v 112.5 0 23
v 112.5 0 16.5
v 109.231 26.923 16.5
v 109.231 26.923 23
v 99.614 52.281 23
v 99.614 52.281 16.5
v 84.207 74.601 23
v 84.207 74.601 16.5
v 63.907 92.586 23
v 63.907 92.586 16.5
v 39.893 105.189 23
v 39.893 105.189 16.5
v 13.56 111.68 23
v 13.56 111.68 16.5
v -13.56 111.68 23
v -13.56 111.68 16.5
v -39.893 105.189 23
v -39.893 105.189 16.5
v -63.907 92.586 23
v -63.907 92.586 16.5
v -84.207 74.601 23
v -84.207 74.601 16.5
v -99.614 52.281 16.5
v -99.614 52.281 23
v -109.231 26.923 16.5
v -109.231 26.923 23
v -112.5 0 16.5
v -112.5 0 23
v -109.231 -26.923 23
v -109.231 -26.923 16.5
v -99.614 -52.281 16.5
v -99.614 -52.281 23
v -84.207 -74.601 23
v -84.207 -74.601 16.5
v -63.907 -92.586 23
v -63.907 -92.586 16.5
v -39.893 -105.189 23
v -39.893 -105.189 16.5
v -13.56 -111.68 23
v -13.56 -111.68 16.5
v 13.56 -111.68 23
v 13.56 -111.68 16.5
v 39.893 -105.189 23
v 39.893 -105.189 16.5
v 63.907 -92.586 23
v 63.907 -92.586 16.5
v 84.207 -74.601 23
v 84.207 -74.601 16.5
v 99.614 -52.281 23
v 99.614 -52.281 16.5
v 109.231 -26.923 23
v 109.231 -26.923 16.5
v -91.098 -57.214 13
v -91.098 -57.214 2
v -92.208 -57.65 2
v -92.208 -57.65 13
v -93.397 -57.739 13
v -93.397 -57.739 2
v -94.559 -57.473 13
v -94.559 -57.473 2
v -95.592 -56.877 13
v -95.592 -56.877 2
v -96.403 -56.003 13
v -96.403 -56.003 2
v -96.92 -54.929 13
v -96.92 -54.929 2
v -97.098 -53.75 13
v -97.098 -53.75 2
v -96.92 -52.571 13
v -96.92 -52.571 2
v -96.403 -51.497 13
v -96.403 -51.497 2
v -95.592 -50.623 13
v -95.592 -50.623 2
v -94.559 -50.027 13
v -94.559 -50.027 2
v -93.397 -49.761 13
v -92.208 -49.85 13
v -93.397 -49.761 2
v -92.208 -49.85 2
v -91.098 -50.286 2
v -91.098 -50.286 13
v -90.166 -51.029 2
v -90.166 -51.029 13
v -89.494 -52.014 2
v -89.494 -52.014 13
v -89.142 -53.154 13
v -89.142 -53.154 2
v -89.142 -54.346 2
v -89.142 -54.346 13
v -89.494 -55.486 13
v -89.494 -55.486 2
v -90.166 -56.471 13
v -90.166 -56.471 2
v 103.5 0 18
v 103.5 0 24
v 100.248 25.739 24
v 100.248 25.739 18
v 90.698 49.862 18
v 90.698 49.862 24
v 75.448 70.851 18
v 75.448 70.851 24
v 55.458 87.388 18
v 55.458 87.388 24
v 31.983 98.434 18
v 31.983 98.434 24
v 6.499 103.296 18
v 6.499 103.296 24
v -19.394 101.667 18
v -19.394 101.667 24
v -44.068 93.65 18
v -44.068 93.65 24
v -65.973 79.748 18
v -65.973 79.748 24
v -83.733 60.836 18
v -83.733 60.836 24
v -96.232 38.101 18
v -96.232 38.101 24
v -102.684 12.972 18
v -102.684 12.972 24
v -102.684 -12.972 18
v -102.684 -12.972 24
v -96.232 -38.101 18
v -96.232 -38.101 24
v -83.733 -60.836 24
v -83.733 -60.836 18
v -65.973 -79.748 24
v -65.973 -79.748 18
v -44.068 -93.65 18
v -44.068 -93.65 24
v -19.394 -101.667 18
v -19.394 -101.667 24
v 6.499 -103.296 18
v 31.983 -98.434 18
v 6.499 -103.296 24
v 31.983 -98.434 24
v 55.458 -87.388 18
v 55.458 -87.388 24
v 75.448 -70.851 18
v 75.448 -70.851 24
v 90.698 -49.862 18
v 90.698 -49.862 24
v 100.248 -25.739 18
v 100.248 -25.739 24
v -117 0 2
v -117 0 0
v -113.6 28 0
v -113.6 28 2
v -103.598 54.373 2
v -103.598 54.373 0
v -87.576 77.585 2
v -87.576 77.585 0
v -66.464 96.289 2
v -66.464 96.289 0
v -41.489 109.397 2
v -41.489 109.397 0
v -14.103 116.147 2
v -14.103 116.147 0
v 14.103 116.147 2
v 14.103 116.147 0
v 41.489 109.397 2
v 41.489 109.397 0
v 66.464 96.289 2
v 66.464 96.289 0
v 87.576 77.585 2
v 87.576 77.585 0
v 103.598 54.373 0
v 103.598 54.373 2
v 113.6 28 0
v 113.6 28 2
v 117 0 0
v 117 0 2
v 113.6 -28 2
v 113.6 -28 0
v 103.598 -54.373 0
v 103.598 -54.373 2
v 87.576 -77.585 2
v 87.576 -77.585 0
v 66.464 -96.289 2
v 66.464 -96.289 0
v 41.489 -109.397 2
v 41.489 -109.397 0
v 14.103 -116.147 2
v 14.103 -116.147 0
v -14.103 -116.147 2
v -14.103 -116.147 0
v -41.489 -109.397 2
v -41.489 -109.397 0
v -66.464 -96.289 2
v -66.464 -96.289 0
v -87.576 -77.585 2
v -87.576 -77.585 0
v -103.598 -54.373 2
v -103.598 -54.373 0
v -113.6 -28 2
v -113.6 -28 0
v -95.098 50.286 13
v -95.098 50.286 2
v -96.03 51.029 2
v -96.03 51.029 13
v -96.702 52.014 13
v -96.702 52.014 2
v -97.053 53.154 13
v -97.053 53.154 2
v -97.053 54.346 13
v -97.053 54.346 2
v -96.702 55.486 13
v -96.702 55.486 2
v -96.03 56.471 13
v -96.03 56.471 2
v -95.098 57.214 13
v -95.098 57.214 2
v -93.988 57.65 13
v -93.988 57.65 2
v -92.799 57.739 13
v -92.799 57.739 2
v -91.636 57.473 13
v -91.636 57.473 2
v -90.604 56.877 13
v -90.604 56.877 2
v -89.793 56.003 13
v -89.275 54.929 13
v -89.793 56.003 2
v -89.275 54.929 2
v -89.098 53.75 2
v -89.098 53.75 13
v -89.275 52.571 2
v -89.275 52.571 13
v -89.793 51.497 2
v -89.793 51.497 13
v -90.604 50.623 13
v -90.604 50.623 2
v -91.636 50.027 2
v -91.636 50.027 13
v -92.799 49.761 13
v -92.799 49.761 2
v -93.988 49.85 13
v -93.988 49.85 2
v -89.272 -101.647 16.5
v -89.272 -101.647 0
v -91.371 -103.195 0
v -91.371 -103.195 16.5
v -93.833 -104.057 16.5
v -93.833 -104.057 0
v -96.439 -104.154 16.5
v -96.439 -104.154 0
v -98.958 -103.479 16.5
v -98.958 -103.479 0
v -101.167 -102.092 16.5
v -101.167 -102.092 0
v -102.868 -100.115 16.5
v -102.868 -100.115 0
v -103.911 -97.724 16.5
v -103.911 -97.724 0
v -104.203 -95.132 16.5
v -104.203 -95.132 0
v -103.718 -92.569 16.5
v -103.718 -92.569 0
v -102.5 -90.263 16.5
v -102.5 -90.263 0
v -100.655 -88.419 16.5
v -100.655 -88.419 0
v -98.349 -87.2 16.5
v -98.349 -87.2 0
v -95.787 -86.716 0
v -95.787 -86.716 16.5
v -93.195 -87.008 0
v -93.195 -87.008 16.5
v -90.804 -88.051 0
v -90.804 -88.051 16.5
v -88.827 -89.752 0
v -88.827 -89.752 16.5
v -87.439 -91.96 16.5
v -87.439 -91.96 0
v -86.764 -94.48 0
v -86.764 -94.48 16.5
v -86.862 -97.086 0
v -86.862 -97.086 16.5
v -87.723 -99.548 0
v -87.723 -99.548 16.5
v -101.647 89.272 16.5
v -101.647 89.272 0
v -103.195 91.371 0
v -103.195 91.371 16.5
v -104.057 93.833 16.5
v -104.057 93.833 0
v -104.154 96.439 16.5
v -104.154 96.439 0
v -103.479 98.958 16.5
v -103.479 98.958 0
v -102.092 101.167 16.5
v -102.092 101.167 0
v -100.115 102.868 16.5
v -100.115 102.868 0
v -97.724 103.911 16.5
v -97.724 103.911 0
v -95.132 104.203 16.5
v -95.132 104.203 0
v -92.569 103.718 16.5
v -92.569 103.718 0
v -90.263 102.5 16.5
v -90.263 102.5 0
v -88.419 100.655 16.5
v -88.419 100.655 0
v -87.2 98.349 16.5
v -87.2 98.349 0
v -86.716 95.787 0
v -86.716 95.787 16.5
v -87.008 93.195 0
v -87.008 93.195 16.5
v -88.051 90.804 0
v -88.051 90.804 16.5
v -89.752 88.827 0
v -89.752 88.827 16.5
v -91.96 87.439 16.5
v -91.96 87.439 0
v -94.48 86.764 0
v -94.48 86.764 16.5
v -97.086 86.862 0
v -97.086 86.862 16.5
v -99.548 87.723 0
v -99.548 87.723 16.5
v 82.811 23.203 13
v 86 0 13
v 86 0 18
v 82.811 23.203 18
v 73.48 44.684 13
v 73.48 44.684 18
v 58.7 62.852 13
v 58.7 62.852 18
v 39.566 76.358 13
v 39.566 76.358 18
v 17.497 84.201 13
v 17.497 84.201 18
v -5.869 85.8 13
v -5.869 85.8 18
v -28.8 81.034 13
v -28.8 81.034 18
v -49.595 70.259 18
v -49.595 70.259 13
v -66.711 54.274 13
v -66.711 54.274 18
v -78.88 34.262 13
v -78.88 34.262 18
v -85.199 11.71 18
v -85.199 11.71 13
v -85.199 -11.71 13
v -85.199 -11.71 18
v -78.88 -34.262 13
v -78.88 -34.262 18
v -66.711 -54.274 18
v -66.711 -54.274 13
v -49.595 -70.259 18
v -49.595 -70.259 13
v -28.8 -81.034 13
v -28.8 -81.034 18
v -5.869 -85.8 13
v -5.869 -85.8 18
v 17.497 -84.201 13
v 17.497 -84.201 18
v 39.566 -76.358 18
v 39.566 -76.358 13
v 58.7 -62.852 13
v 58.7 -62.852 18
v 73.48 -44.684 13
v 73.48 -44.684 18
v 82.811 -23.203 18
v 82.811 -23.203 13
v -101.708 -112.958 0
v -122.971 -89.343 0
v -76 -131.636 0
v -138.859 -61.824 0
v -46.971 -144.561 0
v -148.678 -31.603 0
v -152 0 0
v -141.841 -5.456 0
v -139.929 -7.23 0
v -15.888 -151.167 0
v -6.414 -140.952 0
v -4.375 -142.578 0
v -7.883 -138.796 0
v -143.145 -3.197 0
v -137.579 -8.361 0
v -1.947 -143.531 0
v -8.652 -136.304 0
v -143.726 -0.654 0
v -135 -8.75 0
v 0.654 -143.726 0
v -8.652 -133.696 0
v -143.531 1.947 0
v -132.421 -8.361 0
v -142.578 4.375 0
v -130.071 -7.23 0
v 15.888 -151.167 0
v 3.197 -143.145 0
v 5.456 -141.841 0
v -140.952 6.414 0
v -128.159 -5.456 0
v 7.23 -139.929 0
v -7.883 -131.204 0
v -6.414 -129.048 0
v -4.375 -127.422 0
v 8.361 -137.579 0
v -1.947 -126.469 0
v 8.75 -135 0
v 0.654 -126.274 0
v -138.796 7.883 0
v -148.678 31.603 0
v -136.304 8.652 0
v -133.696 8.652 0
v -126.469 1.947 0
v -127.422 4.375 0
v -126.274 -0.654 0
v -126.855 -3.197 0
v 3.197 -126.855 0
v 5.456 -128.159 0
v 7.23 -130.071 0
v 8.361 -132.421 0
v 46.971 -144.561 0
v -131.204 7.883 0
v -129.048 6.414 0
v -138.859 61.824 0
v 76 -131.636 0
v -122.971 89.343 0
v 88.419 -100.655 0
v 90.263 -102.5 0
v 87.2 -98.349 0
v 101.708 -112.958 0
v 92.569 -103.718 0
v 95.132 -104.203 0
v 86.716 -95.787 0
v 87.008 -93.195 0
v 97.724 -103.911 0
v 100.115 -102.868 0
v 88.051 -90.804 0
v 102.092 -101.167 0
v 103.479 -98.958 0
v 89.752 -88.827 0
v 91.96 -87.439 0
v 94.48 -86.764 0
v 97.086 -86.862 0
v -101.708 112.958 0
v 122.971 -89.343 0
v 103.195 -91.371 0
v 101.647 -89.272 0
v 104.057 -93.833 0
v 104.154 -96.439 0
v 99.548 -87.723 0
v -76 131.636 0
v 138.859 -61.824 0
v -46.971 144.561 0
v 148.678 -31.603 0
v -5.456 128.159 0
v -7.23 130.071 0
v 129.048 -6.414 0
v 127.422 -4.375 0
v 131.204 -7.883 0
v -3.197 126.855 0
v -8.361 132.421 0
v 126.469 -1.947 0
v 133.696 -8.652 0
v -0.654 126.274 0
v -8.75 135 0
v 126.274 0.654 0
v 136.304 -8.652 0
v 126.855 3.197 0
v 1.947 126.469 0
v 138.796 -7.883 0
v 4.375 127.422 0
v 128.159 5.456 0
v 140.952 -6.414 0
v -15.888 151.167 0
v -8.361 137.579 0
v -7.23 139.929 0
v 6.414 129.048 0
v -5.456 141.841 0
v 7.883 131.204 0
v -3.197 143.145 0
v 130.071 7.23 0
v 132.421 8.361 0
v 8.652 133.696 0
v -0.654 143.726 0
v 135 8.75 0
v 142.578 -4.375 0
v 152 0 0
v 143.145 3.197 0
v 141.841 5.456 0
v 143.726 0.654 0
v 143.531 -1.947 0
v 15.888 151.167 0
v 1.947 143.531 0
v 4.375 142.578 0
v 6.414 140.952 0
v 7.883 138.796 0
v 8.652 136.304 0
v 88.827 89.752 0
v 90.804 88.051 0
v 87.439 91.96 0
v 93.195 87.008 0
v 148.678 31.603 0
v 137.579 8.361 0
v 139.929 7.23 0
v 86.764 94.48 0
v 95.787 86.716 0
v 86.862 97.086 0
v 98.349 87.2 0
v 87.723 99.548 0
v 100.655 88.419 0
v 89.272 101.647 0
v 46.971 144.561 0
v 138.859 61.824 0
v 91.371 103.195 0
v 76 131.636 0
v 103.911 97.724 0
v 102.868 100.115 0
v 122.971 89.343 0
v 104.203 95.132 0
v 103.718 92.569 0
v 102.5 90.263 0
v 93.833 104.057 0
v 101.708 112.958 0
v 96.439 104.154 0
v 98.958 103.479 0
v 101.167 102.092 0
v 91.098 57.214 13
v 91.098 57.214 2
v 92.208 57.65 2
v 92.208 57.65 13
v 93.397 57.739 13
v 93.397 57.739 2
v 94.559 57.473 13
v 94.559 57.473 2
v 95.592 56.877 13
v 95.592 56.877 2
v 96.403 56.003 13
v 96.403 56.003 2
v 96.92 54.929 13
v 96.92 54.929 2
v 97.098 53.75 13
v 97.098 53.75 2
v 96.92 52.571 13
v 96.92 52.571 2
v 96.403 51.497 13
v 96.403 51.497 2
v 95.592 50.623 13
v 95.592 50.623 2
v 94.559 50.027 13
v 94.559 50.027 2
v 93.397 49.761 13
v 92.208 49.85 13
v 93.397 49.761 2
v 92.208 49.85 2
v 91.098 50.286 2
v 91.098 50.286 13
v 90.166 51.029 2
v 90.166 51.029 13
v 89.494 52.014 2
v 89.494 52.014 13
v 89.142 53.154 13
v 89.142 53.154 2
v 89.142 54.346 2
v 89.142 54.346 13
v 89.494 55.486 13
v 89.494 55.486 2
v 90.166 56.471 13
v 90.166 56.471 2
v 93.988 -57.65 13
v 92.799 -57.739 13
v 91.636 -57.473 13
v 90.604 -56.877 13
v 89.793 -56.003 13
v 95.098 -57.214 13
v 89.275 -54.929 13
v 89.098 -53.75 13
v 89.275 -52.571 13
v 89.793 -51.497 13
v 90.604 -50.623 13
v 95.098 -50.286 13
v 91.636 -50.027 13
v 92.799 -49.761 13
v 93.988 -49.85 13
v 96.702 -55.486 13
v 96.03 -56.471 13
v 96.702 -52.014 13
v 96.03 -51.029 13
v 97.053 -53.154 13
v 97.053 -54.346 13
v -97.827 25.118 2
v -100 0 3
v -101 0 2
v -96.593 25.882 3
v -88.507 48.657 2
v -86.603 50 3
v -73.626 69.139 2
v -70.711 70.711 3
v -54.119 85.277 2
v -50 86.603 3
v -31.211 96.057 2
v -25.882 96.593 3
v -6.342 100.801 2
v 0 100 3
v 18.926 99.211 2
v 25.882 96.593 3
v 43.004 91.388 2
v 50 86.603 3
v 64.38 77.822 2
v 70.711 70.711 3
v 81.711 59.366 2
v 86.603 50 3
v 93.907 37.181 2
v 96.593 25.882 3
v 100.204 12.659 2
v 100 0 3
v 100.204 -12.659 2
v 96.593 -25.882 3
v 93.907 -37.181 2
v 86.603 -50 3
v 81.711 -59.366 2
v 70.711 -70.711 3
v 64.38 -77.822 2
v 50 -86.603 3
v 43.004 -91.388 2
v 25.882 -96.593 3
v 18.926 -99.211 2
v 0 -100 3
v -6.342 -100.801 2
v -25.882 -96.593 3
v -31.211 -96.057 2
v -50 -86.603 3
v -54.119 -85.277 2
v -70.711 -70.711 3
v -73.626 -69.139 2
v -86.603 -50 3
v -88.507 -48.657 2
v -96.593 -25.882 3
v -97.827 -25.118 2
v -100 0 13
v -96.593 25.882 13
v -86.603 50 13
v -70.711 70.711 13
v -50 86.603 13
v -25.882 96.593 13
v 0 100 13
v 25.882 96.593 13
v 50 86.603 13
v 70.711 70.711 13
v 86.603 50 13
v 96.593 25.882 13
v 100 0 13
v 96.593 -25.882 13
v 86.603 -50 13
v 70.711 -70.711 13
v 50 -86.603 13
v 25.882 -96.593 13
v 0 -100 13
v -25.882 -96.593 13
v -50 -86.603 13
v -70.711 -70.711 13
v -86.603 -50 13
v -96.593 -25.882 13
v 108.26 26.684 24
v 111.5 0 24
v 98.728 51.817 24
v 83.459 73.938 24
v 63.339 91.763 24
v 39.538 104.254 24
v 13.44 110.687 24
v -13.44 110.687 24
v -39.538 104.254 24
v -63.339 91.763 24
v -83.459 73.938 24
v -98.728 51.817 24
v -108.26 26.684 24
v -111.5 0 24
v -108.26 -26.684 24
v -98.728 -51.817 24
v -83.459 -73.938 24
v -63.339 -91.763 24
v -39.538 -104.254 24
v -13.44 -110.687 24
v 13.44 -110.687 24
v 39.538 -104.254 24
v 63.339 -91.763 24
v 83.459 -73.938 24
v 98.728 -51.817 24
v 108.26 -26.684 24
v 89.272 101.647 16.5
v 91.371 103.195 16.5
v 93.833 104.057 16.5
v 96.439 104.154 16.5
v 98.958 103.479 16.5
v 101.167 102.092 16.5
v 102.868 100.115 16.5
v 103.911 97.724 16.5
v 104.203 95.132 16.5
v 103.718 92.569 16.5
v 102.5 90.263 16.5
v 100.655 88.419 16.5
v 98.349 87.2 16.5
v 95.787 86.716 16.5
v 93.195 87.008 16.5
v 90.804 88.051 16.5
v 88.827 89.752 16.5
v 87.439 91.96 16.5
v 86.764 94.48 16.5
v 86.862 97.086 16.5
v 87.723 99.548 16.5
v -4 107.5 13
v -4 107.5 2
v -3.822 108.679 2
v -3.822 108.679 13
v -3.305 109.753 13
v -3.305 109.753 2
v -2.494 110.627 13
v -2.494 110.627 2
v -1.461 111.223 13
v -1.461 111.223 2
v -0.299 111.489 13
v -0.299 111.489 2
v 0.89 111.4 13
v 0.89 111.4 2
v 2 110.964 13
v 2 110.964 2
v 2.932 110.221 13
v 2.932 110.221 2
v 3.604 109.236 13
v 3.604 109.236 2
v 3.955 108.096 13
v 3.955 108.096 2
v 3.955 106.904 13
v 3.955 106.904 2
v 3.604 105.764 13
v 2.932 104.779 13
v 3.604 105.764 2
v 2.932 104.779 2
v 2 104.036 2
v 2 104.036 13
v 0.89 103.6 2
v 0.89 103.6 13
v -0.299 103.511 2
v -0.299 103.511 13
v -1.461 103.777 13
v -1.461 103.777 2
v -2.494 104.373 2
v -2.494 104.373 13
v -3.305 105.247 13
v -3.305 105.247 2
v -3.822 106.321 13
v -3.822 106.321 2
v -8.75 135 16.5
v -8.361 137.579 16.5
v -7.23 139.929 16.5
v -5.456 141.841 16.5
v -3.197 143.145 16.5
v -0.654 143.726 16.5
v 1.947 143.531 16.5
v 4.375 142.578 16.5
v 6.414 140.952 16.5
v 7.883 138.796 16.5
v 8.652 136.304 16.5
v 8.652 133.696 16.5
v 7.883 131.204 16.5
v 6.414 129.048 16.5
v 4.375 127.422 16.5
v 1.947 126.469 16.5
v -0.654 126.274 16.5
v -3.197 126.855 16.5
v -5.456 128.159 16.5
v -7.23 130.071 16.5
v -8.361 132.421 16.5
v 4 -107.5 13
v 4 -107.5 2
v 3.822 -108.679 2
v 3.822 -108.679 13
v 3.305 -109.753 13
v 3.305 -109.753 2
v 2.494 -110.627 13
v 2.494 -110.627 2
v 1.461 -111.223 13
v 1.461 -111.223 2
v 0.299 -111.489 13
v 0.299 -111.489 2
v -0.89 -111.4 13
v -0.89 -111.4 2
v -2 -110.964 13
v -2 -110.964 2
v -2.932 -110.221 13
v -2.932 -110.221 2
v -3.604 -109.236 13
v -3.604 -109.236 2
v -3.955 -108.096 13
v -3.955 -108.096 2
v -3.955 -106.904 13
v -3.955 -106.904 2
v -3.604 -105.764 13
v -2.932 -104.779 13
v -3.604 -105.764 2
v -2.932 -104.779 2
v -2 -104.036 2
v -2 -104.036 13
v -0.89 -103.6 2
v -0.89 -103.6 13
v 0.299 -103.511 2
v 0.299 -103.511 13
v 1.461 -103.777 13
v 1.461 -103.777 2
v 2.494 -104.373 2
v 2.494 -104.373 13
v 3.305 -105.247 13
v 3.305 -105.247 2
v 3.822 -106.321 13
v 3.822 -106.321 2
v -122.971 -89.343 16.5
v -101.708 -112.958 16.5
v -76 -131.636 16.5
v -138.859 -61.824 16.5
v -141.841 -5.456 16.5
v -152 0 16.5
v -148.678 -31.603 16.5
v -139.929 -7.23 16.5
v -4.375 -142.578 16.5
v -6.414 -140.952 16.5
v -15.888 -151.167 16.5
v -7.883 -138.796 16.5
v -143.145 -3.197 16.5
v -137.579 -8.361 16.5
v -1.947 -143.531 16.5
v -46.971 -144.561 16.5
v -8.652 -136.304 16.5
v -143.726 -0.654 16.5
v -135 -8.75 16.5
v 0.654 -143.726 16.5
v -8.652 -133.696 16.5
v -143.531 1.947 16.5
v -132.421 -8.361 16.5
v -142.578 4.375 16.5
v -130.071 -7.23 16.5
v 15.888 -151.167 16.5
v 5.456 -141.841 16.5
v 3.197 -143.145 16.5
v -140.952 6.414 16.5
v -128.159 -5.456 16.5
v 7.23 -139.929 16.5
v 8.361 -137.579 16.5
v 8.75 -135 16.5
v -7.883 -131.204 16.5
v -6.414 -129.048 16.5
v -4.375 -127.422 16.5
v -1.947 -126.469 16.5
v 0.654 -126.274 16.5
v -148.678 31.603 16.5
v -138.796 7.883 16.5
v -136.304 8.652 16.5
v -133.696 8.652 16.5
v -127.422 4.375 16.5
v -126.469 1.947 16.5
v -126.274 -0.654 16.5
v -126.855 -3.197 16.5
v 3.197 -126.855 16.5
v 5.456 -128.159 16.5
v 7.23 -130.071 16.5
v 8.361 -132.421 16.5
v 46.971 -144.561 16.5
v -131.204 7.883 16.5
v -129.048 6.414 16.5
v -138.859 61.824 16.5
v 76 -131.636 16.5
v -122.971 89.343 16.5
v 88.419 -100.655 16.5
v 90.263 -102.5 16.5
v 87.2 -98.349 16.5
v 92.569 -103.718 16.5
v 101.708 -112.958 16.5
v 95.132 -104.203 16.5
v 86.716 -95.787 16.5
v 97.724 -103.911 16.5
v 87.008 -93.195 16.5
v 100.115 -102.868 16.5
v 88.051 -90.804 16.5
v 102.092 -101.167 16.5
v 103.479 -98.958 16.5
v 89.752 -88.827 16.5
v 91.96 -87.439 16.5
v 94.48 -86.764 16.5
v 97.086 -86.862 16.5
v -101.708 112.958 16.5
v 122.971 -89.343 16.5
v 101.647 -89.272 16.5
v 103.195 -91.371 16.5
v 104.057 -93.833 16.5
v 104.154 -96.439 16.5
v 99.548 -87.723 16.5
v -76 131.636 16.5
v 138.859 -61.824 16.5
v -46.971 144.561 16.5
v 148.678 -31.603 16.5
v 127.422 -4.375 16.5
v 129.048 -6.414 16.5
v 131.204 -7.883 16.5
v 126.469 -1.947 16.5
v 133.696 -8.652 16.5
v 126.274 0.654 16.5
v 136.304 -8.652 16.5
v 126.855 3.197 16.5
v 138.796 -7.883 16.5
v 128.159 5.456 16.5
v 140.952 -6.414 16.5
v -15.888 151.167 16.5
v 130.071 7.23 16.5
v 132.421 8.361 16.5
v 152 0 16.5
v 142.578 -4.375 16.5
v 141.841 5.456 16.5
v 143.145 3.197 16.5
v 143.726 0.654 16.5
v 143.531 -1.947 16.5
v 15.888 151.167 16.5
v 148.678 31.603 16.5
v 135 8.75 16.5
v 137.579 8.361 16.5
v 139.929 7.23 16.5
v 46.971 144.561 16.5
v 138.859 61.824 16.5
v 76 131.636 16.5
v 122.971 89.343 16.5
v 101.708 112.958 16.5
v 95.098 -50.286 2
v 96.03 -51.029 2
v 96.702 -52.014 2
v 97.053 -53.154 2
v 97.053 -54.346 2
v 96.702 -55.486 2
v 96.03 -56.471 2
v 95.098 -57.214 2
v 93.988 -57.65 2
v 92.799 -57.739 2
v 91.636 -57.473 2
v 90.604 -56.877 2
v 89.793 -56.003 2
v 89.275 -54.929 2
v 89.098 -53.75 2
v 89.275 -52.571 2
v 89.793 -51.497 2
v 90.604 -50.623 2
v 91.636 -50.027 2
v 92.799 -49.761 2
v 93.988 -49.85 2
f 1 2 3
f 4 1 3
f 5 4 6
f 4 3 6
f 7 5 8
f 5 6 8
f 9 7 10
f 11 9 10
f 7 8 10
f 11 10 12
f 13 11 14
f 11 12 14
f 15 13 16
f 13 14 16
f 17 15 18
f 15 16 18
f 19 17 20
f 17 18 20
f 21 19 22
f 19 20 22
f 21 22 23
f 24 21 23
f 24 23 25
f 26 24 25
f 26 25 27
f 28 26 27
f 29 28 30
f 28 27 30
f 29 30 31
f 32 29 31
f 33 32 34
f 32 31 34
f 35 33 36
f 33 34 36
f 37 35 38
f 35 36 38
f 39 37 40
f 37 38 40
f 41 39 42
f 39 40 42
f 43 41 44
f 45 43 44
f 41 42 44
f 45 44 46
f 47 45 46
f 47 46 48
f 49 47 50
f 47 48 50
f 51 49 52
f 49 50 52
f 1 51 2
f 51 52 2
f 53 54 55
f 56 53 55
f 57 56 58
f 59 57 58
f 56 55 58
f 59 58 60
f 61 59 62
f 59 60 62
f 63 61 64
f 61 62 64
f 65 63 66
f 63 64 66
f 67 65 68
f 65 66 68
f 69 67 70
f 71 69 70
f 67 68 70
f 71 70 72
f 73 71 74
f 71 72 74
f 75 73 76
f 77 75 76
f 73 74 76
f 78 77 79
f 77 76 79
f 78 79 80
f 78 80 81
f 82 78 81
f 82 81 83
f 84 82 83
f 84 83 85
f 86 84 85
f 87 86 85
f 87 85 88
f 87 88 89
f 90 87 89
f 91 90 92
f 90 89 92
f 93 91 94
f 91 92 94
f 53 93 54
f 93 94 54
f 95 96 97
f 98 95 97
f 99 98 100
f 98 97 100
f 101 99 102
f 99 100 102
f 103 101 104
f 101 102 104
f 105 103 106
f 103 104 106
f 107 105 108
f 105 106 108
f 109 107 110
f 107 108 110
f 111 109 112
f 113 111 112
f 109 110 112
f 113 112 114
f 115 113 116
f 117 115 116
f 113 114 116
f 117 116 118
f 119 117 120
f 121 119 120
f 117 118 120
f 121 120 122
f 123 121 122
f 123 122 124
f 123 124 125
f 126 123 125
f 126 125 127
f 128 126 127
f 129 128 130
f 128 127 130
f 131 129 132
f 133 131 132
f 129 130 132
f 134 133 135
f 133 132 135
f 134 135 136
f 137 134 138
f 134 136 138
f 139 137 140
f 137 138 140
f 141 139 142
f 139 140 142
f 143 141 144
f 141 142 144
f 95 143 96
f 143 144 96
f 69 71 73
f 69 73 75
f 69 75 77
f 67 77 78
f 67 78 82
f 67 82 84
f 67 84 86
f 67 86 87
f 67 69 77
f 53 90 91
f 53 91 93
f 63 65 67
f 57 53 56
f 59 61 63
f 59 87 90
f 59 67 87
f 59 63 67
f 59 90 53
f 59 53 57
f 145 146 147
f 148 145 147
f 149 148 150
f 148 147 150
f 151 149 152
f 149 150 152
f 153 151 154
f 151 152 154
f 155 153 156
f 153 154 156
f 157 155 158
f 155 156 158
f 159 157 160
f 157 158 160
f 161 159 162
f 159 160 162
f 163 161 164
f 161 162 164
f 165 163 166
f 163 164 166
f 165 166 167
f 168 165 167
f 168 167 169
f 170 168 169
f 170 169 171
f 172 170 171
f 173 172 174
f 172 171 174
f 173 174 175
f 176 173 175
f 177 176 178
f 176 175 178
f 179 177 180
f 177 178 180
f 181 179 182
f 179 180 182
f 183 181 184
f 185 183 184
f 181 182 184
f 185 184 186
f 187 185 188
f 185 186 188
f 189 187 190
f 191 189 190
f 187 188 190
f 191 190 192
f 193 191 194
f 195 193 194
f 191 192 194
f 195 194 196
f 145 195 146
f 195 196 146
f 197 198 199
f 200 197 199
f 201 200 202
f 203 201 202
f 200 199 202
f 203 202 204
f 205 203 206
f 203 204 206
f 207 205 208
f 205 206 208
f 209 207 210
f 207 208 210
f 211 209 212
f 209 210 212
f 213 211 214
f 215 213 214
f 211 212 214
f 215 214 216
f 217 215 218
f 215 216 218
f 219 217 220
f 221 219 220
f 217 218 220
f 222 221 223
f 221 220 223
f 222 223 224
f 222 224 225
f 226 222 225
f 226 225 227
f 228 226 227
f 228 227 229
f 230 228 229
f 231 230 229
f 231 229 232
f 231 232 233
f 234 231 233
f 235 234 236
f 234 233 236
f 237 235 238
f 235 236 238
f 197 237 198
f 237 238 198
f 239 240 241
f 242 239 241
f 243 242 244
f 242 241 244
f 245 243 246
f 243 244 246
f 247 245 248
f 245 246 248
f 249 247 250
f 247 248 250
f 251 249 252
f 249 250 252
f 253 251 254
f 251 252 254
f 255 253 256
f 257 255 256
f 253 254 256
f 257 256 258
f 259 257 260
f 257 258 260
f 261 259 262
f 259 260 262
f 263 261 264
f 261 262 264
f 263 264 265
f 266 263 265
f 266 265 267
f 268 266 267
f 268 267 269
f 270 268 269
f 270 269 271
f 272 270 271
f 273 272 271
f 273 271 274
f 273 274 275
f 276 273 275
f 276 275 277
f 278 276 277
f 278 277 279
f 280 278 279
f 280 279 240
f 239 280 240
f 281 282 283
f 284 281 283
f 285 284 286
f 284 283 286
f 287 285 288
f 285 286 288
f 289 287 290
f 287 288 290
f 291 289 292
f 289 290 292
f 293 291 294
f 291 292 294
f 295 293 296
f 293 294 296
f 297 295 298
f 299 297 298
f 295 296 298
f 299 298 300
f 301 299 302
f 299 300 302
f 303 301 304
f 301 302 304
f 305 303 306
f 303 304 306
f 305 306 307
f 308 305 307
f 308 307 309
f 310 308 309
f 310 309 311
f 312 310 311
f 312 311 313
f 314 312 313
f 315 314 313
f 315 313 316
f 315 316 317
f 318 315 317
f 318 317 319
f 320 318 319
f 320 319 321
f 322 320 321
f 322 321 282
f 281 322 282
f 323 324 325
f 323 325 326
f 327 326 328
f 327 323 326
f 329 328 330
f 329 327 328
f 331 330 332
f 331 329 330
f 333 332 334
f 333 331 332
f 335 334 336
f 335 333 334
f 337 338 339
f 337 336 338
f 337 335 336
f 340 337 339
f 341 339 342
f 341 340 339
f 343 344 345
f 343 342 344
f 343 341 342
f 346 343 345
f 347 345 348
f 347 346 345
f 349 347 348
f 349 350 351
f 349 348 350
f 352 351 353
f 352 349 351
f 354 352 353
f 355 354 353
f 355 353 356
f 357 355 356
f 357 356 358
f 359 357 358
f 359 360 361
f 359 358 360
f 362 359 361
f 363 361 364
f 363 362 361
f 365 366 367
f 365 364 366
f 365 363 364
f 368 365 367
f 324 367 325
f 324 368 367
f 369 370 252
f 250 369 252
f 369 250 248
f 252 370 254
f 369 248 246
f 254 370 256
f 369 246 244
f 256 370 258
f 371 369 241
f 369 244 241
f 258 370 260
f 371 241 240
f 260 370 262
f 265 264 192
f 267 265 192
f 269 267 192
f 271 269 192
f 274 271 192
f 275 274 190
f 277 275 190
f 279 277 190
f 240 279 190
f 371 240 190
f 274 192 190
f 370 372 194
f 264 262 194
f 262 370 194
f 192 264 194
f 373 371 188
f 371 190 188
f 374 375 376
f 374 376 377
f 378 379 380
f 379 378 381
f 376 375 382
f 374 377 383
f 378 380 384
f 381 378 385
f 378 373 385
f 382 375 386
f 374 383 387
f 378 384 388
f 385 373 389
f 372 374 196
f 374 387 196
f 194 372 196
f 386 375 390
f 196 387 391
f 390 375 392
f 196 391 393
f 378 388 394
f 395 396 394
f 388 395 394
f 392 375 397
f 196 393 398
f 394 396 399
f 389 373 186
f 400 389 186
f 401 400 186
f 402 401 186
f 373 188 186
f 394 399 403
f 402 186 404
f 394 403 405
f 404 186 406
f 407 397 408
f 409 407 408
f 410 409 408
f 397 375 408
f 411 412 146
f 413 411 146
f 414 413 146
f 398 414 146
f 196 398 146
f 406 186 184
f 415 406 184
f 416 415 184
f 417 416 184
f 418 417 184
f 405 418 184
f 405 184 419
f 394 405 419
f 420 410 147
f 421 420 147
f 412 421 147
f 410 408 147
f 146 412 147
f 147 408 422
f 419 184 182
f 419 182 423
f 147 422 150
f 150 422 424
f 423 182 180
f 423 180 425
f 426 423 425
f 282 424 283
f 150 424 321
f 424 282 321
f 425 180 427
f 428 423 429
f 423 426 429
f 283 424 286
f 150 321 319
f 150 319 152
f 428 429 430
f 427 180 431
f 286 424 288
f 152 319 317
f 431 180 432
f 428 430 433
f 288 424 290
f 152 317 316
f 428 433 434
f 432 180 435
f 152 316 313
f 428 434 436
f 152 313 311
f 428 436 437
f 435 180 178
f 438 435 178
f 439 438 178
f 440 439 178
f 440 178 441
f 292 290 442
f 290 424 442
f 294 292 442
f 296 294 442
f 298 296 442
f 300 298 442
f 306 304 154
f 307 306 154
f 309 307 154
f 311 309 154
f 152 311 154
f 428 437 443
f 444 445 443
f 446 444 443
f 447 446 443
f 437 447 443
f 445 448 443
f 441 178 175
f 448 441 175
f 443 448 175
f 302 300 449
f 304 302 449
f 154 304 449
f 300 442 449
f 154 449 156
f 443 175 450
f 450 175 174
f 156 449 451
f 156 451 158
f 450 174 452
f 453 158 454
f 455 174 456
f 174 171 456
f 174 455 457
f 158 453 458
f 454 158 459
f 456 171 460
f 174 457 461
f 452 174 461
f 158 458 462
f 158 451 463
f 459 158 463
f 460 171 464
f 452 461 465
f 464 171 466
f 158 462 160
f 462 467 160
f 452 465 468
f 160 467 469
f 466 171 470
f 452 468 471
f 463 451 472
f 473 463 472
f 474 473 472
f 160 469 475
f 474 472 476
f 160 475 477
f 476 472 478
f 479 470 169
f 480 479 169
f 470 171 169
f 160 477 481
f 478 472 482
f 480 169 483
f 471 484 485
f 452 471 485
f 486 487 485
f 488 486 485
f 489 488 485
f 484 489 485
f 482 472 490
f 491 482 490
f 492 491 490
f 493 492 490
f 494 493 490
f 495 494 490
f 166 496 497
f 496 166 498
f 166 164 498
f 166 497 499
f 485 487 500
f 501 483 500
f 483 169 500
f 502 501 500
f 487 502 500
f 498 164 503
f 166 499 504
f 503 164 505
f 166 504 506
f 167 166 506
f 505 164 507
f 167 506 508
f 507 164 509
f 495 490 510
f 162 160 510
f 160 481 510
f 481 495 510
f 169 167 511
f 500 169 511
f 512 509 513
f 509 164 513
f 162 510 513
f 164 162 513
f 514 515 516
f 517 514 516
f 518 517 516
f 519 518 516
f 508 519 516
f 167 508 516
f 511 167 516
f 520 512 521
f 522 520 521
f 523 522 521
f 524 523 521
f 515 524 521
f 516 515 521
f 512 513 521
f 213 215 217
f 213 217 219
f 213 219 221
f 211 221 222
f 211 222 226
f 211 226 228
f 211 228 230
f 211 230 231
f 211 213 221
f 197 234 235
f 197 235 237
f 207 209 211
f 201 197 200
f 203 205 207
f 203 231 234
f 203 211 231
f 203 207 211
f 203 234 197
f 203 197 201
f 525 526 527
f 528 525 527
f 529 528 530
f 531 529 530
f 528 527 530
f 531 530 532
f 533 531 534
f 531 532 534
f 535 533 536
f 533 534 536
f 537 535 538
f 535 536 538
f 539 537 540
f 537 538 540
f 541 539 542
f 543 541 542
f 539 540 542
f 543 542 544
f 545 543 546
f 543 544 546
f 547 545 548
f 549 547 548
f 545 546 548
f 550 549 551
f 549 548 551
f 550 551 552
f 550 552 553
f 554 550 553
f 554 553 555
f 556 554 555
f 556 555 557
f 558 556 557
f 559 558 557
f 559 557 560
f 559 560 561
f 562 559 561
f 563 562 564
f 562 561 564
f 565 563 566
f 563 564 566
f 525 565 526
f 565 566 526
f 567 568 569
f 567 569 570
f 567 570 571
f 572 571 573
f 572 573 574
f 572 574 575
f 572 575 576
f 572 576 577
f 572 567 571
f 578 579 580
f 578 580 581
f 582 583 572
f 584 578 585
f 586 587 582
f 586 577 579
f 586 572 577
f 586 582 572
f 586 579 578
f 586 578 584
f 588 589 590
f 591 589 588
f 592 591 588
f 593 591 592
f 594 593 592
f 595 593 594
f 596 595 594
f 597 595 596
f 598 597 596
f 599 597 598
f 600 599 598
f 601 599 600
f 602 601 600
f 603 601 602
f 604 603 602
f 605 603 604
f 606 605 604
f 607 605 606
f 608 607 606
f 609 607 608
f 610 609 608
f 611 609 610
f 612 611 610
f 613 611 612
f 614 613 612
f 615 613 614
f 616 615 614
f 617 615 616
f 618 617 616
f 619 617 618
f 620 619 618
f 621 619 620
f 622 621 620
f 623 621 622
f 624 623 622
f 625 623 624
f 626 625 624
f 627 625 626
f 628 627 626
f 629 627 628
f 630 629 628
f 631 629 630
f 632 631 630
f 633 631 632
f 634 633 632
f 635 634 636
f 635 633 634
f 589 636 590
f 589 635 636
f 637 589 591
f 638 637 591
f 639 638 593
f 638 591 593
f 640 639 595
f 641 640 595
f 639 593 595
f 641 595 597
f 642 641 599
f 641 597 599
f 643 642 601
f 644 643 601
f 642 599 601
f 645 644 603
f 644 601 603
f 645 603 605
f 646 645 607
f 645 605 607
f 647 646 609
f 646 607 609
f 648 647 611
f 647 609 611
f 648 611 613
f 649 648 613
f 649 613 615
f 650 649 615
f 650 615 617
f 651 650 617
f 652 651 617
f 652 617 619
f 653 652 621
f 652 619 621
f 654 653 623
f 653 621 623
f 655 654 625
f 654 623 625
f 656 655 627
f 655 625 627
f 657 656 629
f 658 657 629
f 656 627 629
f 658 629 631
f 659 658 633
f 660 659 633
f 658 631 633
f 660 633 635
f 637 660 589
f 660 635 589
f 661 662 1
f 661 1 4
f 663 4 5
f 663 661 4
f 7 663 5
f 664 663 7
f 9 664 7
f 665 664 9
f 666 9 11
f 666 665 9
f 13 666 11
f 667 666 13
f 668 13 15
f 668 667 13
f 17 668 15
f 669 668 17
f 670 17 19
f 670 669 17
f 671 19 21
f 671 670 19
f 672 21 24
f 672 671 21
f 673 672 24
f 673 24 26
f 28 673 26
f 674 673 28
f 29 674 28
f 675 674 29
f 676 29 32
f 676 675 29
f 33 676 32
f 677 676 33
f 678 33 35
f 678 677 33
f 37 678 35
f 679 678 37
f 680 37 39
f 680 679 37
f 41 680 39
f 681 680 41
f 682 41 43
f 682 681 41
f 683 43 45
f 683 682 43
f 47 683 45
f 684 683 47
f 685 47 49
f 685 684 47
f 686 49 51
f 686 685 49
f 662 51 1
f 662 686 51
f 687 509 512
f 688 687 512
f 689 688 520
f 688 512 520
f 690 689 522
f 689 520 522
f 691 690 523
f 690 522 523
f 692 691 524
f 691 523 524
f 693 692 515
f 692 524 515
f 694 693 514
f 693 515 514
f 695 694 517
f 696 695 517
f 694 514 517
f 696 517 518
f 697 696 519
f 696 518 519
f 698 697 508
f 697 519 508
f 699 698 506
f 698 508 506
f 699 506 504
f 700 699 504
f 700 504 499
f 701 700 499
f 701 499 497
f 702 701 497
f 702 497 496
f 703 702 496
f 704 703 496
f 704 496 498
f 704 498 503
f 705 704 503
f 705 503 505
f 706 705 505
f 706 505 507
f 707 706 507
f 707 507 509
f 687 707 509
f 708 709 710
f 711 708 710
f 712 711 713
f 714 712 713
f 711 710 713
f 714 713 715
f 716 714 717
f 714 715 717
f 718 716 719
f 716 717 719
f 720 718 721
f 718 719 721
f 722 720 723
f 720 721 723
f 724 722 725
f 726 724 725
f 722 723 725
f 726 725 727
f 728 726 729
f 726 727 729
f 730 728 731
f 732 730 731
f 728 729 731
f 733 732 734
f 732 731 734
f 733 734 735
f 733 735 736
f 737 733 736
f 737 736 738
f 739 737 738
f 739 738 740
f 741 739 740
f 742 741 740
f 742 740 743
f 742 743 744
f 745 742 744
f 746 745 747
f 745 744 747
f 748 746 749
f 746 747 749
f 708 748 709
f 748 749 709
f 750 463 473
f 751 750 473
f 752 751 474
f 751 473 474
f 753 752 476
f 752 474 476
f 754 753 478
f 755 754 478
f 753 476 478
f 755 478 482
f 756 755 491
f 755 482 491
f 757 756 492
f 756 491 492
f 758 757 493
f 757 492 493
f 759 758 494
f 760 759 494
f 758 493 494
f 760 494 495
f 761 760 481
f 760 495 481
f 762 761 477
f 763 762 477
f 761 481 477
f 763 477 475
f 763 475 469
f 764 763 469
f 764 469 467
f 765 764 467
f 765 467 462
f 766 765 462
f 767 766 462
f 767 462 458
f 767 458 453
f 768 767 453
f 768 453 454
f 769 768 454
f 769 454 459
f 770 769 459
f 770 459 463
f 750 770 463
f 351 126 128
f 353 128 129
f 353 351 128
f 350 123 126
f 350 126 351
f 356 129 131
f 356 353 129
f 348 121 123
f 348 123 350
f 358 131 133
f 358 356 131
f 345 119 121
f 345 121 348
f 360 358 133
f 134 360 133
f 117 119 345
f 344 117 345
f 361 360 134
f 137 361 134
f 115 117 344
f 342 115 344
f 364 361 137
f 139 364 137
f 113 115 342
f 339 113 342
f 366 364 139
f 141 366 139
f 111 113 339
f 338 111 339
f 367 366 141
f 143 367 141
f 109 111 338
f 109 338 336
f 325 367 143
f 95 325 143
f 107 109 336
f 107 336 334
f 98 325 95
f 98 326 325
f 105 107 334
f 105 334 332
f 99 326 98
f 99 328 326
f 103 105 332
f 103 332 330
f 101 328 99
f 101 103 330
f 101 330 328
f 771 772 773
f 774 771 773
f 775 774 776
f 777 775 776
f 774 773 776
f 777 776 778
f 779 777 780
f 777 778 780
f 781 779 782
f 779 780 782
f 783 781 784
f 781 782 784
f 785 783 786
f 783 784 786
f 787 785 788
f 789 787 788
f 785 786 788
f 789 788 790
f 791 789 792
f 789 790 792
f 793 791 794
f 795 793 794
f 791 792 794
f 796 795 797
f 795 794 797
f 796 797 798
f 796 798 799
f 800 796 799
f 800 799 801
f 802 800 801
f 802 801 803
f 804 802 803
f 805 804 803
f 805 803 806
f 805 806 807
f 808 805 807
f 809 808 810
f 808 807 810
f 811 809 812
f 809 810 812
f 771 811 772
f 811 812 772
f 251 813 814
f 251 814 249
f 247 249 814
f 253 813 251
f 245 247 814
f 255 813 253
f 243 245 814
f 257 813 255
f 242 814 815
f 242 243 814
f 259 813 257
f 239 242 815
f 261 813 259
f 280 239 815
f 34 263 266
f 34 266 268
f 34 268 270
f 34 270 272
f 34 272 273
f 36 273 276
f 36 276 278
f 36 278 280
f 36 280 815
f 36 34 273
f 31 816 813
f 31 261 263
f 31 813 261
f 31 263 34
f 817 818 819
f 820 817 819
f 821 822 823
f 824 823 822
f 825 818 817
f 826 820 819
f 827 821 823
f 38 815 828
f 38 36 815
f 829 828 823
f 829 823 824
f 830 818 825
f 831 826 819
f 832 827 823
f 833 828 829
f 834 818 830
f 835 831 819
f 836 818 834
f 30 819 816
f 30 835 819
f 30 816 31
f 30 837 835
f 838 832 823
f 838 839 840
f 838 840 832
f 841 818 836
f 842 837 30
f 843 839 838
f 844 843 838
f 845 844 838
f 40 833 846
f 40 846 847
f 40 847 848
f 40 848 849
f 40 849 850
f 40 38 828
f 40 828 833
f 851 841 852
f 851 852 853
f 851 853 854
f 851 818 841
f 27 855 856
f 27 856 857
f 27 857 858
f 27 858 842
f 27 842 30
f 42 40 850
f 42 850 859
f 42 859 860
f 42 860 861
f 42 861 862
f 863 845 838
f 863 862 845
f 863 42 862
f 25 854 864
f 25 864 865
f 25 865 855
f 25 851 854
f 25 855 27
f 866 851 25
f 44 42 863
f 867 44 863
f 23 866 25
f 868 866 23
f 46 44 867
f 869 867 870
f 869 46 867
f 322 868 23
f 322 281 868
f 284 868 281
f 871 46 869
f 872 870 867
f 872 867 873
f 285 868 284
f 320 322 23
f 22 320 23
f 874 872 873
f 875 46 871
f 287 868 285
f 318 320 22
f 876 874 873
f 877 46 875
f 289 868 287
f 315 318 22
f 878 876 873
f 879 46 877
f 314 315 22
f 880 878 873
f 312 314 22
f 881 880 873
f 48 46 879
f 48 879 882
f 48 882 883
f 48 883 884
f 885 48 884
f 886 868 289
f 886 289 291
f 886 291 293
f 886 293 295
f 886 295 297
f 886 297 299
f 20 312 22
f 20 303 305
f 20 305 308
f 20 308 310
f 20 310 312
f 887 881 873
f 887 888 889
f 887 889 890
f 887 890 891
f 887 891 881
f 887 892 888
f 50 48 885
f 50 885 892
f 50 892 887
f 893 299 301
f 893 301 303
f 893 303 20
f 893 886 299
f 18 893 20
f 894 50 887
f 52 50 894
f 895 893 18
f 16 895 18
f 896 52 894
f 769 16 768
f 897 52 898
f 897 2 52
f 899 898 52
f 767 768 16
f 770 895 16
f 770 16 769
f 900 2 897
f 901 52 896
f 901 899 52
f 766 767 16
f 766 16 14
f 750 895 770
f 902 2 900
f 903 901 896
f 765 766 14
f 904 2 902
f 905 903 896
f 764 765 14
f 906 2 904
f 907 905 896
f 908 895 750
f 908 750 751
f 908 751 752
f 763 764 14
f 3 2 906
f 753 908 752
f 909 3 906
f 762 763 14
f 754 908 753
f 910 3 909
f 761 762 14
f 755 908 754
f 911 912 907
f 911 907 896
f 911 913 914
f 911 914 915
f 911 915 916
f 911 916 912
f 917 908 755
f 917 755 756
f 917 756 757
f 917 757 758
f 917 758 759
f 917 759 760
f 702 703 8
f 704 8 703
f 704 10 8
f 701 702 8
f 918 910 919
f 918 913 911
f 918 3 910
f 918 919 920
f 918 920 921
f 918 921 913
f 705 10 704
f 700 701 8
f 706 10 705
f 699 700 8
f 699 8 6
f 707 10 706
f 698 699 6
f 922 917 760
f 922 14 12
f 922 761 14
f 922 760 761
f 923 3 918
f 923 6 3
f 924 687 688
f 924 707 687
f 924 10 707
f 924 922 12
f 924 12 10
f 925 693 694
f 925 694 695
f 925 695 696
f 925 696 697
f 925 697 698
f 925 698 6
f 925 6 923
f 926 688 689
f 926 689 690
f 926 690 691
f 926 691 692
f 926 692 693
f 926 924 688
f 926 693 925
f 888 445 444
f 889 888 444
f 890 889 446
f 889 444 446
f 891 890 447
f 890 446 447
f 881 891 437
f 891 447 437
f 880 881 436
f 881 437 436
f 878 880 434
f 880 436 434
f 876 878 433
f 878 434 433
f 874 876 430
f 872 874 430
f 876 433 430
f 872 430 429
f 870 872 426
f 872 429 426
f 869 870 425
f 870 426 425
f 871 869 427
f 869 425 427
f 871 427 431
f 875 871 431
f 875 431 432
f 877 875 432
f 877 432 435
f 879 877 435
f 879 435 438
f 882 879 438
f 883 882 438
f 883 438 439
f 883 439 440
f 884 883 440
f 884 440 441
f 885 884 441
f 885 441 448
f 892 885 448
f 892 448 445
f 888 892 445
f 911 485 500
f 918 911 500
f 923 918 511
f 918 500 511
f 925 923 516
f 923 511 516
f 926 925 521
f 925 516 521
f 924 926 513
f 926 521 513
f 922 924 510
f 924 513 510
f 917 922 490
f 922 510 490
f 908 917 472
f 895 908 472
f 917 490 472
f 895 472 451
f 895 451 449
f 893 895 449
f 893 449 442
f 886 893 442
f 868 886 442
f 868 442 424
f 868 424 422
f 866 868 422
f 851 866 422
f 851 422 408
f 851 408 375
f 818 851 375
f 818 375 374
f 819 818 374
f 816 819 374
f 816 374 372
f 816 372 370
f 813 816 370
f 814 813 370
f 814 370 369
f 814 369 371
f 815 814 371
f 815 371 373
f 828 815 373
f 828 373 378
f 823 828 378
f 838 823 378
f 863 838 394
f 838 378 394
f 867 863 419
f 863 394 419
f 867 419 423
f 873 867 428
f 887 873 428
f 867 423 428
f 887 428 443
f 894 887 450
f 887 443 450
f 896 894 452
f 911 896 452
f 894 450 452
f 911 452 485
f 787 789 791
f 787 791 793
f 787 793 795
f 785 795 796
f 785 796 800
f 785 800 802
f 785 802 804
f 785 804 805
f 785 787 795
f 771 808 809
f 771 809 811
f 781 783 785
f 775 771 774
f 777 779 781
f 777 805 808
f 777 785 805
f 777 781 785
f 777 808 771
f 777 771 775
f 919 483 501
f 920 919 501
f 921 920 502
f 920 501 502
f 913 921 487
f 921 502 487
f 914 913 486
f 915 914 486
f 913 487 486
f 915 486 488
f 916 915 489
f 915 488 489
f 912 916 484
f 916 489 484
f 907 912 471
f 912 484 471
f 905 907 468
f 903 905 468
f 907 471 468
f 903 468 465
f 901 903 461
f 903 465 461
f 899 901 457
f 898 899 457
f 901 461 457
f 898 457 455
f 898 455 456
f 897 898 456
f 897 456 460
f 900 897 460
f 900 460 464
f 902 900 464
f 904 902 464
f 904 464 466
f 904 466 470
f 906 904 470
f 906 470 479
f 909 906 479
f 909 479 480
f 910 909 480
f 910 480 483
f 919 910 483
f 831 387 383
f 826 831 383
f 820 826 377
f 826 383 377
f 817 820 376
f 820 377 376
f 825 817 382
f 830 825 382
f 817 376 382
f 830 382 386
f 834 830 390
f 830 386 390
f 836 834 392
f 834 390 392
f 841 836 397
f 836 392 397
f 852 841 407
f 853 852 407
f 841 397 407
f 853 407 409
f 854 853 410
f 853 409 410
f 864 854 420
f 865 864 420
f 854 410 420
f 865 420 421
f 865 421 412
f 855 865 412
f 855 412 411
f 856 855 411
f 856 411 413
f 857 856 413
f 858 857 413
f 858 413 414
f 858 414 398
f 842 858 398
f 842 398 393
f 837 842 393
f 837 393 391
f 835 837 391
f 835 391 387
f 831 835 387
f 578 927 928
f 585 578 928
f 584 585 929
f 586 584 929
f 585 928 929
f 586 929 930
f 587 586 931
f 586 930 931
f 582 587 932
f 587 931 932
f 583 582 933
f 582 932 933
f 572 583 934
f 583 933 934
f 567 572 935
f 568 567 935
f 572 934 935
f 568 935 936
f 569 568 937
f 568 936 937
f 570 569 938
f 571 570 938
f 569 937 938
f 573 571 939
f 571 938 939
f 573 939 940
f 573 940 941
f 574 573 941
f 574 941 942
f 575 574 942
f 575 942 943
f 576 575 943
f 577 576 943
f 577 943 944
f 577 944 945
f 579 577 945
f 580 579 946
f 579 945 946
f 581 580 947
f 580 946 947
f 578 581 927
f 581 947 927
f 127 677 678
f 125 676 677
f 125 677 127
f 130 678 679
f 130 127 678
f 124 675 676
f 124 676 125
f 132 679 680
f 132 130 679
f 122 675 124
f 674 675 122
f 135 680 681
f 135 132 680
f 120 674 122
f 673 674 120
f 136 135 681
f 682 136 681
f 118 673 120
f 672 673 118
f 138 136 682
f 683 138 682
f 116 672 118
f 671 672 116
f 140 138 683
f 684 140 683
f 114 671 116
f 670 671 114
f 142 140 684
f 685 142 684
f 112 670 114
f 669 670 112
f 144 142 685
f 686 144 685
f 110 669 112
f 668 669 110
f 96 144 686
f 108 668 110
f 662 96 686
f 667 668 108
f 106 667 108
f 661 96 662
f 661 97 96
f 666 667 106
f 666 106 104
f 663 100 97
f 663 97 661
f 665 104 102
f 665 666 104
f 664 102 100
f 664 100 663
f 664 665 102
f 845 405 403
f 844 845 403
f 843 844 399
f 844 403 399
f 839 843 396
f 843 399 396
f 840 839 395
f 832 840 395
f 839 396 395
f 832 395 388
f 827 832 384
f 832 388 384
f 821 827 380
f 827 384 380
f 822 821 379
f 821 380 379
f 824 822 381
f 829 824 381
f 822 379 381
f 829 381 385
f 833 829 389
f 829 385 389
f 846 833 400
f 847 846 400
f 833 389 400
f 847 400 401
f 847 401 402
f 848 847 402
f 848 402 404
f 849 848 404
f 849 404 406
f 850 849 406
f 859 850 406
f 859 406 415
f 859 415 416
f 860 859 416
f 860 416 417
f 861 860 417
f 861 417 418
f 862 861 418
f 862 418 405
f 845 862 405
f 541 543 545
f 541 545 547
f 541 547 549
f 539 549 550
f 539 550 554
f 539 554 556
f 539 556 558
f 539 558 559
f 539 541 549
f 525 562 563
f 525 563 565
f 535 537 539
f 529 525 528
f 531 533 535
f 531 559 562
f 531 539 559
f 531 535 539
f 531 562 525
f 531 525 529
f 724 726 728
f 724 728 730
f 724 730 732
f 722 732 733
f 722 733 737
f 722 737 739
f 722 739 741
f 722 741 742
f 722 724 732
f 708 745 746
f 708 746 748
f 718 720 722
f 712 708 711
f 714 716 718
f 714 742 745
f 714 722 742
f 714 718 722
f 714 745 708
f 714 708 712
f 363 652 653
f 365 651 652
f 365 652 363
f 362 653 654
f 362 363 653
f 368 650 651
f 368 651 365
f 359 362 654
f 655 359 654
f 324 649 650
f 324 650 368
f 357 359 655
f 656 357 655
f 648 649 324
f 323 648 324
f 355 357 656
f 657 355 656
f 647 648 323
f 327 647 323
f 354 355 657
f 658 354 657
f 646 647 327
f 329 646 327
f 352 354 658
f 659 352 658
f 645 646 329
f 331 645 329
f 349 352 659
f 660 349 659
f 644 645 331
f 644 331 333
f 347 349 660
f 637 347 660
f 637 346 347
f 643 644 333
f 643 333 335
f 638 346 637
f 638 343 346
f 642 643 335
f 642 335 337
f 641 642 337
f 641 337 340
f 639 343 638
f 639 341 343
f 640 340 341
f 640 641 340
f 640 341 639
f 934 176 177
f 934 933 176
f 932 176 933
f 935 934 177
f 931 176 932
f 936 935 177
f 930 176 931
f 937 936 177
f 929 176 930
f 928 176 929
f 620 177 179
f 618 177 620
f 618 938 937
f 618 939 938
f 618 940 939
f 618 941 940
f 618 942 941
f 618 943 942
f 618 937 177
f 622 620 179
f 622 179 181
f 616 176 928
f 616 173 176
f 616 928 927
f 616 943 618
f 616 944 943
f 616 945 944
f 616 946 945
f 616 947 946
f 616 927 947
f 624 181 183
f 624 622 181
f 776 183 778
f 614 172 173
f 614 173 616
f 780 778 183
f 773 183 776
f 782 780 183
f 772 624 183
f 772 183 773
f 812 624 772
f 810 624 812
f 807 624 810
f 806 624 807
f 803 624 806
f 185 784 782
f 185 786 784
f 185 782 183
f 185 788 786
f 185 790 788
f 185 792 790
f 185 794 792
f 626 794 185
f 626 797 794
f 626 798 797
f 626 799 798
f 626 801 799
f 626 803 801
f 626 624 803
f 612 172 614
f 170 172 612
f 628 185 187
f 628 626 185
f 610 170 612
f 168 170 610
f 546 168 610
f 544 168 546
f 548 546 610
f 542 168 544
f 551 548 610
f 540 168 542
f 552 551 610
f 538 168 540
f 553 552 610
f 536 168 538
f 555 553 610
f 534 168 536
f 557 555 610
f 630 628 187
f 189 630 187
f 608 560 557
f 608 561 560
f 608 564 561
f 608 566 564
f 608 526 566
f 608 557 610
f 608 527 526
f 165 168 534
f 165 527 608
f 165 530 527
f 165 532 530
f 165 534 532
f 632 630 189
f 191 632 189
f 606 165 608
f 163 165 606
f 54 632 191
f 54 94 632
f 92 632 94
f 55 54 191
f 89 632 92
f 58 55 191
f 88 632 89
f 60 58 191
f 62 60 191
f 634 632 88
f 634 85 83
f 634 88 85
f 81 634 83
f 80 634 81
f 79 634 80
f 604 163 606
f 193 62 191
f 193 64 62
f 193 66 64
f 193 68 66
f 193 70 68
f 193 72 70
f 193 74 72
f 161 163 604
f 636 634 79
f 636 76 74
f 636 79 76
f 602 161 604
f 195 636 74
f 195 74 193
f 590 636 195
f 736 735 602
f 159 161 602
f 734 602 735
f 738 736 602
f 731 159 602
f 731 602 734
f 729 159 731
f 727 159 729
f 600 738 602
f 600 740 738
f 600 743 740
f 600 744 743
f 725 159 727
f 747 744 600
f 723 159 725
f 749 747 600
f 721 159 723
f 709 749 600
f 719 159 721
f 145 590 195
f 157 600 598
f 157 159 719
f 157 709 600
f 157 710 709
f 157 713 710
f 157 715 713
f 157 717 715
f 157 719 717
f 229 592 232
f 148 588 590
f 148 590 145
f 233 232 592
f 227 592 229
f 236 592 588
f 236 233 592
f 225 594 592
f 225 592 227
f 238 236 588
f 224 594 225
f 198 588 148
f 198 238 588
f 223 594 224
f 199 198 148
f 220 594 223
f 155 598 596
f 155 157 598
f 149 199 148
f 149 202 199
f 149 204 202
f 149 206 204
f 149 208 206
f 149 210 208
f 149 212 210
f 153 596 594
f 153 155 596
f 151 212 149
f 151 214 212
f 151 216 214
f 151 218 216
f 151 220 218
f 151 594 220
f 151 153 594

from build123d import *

# Parameters (mm, degrees)
SKETCH1_R           = 152
SKETCH1_R_2         = 86
BOSS_EXTRUDE3_DEPTH = 24
CUT_EXTRUDE6_START  = -7.5
SKETCH5_R           = 152
SKETCH5_R_2         = 112.5
CUT_EXTRUDE6_DEPTH  = 7.5
SKETCH6_R           = 103.5
CUT_EXTRUDE7_DEPTH  = 6
CHAMFER1_SIZE       = 1
SKETCH8_R           = 117
CUT_EXTRUDE8_DEPTH  = 2
SKETCH16_R          = 100
CUT_EXTRUDE9_DEPTH  = 11
CHAMFER3_SIZE       = 1
SKETCH19_R          = 4
CUT_EXTRUDE12_DEPTH = 11
CIRPATTERN1_COUNT   = 6
SKETCH3_R           = 8.75
CUT_EXTRUDE13_DEPTH = 217.296093354
CIRPATTERN2_COUNT   = 8


with BuildPart() as part:
    # Sketch1 → Boss-Extrude3 (new body)
    with BuildSketch(Plane.XY):
        Circle(SKETCH1_R)
        Circle(SKETCH1_R_2, mode=Mode.SUBTRACT)
    extrude(amount=BOSS_EXTRUDE3_DEPTH)

    # Sketch5 → Cut-Extrude6 (cut)
    with BuildSketch(Plane.XY.offset(24).offset(CUT_EXTRUDE6_START)):
        Circle(SKETCH5_R)
        Circle(SKETCH5_R_2, mode=Mode.SUBTRACT)
    extrude(amount=CUT_EXTRUDE6_DEPTH, mode=Mode.SUBTRACT)

    # Sketch6 → Cut-Extrude7 (cut)
    with BuildSketch(Plane.XY.offset(24)):
        Circle(SKETCH6_R)
    extrude(amount=-CUT_EXTRUDE7_DEPTH, mode=Mode.SUBTRACT)

    # Chamfer1
    chamfer1_edges = [part.edges().sort_by_distance(p)[0] for p in [
        (-112.5, 0, 24),
    ]]
    chamfer(chamfer1_edges, length=CHAMFER1_SIZE)

    # Sketch8 → Cut-Extrude8 (cut)
    with BuildSketch(Plane(origin=(0, 0, 0), x_dir=(-1, 0, 0), z_dir=(0, 0, -1))):
        Circle(SKETCH8_R)
    extrude(amount=-CUT_EXTRUDE8_DEPTH, mode=Mode.SUBTRACT)

    # Sketch16 → Cut-Extrude9 (cut)
    with BuildSketch(Plane(origin=(0, 0, 2), x_dir=(-1, 0, 0), z_dir=(0, 0, -1))):
        Circle(SKETCH16_R)
    extrude(amount=-CUT_EXTRUDE9_DEPTH, mode=Mode.SUBTRACT)

    # Chamfer3
    chamfer3_edges = [part.edges().sort_by_distance(p)[0] for p in [
        (100, 0, 2),
    ]]
    chamfer(chamfer3_edges, length=CHAMFER3_SIZE)

    # Sketch19 → Cut-Extrude12 (cut)
    with BuildSketch(Plane(origin=(0, 0, 2), x_dir=(-1, 0, 0), z_dir=(0, 0, -1))):
        with Locations((0, 107.5)):
            Circle(SKETCH19_R)
    cut_extrude12 = extrude(amount=-CUT_EXTRUDE12_DEPTH, mode=Mode.SUBTRACT)

    # CirPattern1: Cut-Extrude12 ×6 about axis
    cirpattern1_axis = Axis((0, 0, 0), (0, 0, 1))
    for i in range(1, CIRPATTERN1_COUNT):
        add(cut_extrude12.rotate(cirpattern1_axis, i * 360 / CIRPATTERN1_COUNT), mode=Mode.SUBTRACT)

    # Sketch3 → Cut-Extrude13 (cut, through all)
    with BuildSketch(Plane(origin=(0, 0, 0), x_dir=(-1, 0, 0), z_dir=(0, 0, -1))):
        with Locations((0, 135)):
            Circle(SKETCH3_R)
    cut_extrude13 = extrude(amount=-CUT_EXTRUDE13_DEPTH, mode=Mode.SUBTRACT)

    # CirPattern2: Cut-Extrude13 ×8 about axis
    cirpattern2_axis = Axis((0, 0, 0), (0, 0, 1))
    for i in range(1, CIRPATTERN2_COUNT):
        add(cut_extrude13.rotate(cirpattern2_axis, i * 360 / CIRPATTERN2_COUNT), mode=Mode.SUBTRACT)


solid = part.part
